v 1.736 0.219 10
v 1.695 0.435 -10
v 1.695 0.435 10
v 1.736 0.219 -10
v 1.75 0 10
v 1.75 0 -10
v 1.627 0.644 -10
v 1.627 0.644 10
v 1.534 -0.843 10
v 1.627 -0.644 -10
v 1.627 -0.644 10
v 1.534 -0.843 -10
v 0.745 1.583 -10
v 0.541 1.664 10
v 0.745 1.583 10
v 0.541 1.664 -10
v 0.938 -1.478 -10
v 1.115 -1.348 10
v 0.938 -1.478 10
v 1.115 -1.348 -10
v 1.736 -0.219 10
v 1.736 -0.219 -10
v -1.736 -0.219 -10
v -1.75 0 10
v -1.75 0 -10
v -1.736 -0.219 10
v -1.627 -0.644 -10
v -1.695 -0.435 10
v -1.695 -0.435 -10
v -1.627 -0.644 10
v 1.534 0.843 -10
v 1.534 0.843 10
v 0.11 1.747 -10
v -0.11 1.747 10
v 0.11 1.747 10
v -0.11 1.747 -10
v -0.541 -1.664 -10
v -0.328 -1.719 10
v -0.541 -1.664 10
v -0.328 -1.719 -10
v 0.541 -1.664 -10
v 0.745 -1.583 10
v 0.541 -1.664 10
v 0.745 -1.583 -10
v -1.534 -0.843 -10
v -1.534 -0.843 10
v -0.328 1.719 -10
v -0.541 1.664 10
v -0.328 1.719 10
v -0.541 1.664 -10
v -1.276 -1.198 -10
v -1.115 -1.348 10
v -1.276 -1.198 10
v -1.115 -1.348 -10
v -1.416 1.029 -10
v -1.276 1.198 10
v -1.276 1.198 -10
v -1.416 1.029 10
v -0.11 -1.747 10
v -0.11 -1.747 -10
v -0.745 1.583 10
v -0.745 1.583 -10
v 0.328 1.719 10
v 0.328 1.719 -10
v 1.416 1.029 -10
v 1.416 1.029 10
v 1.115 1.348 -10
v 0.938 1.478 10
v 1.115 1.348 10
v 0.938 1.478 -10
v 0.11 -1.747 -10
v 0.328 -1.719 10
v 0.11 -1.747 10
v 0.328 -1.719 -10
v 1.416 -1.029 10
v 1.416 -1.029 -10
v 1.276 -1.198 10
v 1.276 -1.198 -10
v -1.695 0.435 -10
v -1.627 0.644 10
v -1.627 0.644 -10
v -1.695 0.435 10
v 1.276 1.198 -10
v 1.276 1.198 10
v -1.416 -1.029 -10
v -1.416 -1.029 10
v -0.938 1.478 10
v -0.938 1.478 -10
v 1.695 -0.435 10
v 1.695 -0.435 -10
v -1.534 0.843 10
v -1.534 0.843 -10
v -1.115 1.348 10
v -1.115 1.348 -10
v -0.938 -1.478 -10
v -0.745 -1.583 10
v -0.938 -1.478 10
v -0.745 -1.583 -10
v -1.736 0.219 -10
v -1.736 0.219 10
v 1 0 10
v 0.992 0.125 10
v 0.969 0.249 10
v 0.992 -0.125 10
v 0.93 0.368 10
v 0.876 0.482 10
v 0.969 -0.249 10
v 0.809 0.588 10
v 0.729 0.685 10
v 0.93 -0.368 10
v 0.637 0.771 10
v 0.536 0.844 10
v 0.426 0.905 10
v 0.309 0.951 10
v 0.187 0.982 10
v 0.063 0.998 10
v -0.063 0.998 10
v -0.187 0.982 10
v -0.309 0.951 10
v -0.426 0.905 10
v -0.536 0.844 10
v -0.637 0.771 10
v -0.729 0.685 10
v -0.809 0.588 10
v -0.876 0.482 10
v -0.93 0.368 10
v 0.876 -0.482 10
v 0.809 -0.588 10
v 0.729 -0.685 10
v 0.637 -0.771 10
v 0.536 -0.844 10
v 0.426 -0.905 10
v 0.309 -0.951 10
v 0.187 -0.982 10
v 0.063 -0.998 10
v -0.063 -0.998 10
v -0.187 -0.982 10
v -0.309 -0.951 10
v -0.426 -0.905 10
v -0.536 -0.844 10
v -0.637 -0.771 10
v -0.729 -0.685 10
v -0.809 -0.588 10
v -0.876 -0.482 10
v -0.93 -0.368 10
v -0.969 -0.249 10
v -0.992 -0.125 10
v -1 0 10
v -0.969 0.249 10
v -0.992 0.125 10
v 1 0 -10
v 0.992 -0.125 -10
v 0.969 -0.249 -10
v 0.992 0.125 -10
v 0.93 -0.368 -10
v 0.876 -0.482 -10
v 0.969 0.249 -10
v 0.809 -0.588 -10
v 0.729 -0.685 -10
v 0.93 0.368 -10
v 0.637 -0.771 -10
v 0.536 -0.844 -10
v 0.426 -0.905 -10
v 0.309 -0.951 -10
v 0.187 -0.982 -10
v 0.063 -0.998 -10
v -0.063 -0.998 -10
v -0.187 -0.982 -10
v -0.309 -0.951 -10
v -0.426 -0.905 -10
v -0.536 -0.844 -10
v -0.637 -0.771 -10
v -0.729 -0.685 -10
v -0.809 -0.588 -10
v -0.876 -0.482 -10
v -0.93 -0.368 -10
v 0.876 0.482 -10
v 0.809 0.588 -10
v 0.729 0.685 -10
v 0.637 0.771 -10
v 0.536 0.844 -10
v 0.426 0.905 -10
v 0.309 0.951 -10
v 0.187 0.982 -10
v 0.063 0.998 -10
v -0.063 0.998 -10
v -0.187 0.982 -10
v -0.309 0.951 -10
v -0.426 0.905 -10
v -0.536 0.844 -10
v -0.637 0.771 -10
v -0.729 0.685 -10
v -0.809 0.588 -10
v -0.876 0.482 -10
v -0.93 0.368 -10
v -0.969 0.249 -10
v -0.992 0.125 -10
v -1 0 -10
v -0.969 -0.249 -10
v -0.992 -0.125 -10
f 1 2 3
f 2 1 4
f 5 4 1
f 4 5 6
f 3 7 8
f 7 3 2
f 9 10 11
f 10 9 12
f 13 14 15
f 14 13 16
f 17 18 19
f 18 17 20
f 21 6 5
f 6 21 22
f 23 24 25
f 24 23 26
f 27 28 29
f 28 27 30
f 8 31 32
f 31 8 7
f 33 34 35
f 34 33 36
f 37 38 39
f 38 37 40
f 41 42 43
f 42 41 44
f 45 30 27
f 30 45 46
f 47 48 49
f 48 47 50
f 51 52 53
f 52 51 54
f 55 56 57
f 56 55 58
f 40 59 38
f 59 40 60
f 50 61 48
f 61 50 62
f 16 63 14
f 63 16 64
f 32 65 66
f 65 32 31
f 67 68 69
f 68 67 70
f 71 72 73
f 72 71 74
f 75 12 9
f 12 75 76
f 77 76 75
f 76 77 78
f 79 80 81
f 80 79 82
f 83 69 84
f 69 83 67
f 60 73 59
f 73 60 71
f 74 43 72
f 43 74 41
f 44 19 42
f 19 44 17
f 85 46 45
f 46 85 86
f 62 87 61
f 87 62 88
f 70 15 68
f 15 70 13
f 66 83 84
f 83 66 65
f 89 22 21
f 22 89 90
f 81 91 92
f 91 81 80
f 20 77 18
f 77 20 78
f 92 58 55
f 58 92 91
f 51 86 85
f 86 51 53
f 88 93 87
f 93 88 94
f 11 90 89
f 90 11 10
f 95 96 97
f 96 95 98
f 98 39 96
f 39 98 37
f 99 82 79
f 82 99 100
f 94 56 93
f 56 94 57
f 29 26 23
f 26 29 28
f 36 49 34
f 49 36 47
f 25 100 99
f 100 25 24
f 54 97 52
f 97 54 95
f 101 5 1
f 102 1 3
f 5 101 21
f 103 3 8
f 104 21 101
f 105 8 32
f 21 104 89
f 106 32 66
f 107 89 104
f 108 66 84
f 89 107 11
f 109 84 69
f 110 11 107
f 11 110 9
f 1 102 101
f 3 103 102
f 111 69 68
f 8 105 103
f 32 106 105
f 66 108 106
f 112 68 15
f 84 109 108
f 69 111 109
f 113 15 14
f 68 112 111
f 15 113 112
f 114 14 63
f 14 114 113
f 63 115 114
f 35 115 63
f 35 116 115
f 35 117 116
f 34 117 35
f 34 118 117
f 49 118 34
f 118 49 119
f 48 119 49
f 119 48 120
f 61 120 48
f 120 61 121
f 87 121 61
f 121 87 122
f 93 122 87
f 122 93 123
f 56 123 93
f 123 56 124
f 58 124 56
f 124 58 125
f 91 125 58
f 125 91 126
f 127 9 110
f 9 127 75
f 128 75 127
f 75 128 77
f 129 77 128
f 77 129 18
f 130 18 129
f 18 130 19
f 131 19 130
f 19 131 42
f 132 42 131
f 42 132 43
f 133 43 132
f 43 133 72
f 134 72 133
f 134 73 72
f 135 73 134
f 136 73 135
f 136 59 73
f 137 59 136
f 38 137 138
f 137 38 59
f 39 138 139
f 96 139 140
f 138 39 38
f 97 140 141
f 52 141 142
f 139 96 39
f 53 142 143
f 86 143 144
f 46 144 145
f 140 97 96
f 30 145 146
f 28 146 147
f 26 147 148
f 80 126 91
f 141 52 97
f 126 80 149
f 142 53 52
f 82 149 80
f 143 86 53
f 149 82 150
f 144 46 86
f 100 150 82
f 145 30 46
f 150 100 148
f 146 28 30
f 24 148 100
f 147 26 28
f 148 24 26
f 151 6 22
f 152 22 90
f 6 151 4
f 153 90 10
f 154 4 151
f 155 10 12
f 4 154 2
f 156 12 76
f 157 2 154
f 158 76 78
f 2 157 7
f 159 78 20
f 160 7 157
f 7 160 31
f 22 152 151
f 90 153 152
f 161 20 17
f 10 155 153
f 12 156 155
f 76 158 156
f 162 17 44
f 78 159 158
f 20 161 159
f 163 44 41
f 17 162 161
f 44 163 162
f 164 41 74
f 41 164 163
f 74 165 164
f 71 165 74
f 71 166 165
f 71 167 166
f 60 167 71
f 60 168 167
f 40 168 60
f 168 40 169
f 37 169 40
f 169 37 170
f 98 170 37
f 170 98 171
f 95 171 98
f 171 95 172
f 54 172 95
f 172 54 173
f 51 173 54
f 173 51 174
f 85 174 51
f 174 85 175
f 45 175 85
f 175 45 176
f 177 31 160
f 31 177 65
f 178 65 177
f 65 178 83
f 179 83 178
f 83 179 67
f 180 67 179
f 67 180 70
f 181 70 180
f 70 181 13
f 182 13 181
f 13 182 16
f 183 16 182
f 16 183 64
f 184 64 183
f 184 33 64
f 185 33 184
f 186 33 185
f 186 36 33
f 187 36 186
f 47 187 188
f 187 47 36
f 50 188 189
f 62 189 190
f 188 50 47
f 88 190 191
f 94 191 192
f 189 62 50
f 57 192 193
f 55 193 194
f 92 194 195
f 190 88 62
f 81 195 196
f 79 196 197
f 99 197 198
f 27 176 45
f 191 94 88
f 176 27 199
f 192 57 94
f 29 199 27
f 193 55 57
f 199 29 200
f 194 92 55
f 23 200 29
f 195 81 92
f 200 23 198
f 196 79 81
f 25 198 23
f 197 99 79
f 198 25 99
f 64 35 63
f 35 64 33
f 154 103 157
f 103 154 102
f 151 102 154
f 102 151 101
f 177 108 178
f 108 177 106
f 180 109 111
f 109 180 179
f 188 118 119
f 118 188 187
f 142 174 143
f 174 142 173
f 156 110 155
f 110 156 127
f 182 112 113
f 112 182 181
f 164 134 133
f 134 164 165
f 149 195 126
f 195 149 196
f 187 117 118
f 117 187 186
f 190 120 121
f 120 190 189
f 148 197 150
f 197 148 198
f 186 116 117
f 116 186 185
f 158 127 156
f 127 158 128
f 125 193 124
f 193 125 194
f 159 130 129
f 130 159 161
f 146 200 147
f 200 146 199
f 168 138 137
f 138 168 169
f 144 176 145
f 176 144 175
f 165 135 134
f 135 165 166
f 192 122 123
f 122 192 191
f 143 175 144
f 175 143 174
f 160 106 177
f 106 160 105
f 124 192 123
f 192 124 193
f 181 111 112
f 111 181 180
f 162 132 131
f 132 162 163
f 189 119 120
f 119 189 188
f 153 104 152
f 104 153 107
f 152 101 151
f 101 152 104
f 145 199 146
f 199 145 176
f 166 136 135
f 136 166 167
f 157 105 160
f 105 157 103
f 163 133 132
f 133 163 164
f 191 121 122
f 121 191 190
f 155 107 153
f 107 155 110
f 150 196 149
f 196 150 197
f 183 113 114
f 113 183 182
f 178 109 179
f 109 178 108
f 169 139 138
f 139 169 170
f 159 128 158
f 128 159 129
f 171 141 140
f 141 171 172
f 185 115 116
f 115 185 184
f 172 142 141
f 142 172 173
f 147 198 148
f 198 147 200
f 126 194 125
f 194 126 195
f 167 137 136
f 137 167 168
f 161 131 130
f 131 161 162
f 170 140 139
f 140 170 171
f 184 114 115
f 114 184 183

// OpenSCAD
$fn = 50;


difference() {
	union() {
		translate(v = [0, 0, -10.0000000000]) {
			cylinder(h = 20, r = 1.7500000000);
		}
	}
	union() {
		translate(v = [0, 0, -100.0000000000]) {
			cylinder(h = 200, r = 1.0000000000);
		}
	}
}
